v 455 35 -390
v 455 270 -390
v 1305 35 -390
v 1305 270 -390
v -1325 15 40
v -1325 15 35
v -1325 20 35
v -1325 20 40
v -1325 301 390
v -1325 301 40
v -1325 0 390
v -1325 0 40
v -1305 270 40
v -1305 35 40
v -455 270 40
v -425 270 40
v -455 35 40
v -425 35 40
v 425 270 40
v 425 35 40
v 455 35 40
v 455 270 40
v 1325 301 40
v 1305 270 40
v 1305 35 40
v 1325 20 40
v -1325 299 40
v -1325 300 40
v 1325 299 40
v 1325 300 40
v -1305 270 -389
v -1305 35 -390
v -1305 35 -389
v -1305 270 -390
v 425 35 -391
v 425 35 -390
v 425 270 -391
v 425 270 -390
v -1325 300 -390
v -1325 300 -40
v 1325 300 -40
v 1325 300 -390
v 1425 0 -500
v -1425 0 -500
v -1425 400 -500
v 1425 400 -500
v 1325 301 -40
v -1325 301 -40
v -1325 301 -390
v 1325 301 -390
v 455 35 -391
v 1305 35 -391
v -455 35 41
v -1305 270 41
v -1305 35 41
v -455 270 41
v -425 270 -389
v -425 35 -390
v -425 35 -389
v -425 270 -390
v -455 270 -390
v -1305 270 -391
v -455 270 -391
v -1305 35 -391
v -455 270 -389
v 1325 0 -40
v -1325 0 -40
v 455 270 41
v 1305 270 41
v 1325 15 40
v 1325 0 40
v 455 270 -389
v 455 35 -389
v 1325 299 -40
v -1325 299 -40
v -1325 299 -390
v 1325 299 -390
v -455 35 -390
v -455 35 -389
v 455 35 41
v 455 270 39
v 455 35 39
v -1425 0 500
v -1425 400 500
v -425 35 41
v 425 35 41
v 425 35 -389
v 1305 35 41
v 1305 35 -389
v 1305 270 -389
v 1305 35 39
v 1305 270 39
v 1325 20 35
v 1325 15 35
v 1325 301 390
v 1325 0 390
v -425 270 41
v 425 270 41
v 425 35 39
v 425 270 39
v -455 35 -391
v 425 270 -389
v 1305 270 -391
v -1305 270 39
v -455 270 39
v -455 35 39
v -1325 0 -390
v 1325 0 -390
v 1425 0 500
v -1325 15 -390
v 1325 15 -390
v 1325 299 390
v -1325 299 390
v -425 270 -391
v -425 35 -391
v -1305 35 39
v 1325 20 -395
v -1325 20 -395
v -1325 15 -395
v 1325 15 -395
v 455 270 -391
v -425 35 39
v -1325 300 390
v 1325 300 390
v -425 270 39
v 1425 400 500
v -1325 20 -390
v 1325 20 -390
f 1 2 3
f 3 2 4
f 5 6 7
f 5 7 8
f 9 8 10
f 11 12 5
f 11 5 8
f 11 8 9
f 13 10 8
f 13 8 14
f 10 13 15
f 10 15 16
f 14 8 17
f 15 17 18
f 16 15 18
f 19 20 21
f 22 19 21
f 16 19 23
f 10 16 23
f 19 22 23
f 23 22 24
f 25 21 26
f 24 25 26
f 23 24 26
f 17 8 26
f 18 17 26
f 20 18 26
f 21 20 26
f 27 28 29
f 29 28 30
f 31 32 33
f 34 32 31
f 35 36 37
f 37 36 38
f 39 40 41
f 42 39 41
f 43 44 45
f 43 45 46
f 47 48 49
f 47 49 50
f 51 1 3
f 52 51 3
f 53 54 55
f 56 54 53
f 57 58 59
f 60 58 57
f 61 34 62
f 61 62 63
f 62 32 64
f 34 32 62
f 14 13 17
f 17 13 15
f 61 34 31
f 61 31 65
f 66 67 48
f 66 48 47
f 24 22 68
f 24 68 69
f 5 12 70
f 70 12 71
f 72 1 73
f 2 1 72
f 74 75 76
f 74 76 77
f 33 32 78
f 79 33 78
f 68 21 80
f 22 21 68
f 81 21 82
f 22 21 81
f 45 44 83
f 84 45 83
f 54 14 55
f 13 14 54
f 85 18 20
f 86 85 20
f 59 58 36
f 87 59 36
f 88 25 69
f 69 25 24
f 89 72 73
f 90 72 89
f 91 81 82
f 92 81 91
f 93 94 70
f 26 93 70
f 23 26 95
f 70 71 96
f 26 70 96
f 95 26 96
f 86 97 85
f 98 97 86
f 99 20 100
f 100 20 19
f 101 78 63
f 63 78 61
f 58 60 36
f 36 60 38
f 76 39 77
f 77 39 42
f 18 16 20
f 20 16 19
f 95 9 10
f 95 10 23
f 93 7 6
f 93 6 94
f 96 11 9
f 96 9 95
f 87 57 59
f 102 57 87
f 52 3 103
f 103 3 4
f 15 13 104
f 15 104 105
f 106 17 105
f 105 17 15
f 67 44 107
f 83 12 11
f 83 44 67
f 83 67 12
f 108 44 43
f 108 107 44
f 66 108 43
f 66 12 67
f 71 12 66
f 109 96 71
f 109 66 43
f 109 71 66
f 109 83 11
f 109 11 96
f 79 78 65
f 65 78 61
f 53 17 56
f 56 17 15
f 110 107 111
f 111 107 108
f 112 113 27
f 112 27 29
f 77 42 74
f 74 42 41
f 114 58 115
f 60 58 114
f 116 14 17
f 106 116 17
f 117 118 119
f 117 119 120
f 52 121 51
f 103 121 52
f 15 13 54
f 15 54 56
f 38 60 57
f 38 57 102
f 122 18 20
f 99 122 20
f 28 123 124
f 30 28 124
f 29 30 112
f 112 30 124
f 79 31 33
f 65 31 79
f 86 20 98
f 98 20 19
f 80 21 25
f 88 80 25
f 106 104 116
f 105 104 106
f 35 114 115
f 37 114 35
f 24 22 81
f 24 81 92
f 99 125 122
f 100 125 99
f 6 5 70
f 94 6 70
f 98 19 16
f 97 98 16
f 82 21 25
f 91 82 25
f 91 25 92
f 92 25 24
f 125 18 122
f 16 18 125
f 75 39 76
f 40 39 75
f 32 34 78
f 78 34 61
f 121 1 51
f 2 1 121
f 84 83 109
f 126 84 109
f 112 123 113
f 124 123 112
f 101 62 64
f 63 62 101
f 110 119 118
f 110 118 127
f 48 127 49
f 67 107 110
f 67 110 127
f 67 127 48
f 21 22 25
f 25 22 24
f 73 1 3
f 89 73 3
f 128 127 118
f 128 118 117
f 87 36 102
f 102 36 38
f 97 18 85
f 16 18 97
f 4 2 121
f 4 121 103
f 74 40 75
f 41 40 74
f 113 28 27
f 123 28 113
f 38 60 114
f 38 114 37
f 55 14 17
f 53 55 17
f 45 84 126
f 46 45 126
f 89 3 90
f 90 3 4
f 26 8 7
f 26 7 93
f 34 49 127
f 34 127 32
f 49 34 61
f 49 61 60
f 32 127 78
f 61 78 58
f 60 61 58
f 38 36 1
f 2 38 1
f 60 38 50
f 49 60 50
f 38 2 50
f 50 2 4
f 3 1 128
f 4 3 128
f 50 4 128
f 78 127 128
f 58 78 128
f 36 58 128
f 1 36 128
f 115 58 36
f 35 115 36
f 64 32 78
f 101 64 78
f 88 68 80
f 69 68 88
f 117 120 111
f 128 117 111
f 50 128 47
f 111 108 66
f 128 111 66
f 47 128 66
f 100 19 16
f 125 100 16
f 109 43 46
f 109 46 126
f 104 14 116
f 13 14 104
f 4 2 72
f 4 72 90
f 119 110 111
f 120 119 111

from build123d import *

# Parameters (mm, degrees)
F0_W      = 2850
F0_H      = 1000
F1_DEPTH  = 400
F2_W      = 2650
F2_H      = 350
F3_DEPTH  = 300
F4_W      = 2650
F4_H      = 5
F5_DEPTH  = 5
F6_W      = 850
F6_H      = 235
F7_DEPTH  = 1
F8_W      = 2650
F8_H      = 5
F9_DEPTH  = 5
F10_W     = 850
F10_H     = 235
F10_W_2   = 425
F11_DEPTH = 1
F12_DEPTH = 1
F13_DEPTH = 1
F14_W     = 2650
F14_H     = 350
F15_DEPTH = 1
F16_DEPTH = 1


with BuildPart() as f1:
    # F0 (on Front) → F1 (new body)
    with BuildSketch(Plane.XZ):
        Rectangle(F0_W, F0_H)
    extrude(amount=-F1_DEPTH)

    # F2 (on Front) → F3 (cut)
    with BuildSketch(Plane.XZ):
        with Locations((0, 215)):
            Rectangle(F2_W, F2_H)
        with Locations((0, -215)):
            Rectangle(F2_W, F2_H)
    extrude(amount=-F3_DEPTH, mode=Mode.SUBTRACT)

    # F4 (on face) → F5 (cut)
    with BuildSketch(Plane.XY.offset(-390)):
        with Locations((0, 17.5)):
            Rectangle(F4_W, F4_H)
    extrude(amount=-F5_DEPTH, mode=Mode.SUBTRACT)

    # F6 (on face) → F7 (cut)
    with BuildSketch(Plane.XY.offset(-390)):
        with Locations((-880, 152.5)):
            Rectangle(F6_W, F6_H)
        with Locations((880, 152.5)):
            Rectangle(F6_W, F6_H)
        with Locations((0, 152.5)):
            Rectangle(F6_W, F6_H)
    extrude(amount=-F7_DEPTH, mode=Mode.SUBTRACT)

    # F8 (on face) → F9 (cut)
    with BuildSketch(Plane.XY.offset(40)):
        with Locations((0, 17.5)):
            Rectangle(F8_W, F8_H)
    extrude(amount=-F9_DEPTH, mode=Mode.SUBTRACT)

    # F10 (on face) → F11 (cut)
    with BuildSketch(Plane.XY.offset(40)):
        with Locations((-880, 152.5)):
            Rectangle(F10_W, F10_H)
        with Locations((880, 152.5)):
            Rectangle(F10_W, F10_H)
        with Locations((-212.5, 152.5)):
            Rectangle(F10_W_2, F10_H)
        with Locations((212.5, 152.5)):
            Rectangle(F10_W_2, F10_H)
    extrude(amount=-F11_DEPTH, mode=Mode.SUBTRACT)

    # F14 (on face) → F15 (cut)
    with BuildSketch(Plane.XZ.offset(-300)):
        with Locations((0, -215)):
            Rectangle(F14_W, F14_H)
        with Locations((0, 215)):
            Rectangle(F14_W, F14_H)
    extrude(amount=-F15_DEPTH, mode=Mode.SUBTRACT)


with BuildPart() as f12:
    # F10 (on face) → F12 (new body)
    with BuildSketch(Plane.XY.offset(40)):
        with Locations((-880, 152.5)):
            Rectangle(F10_W, F10_H)
        with Locations((880, 152.5)):
            Rectangle(F10_W, F10_H)
        with Locations((-212.5, 152.5)):
            Rectangle(F10_W_2, F10_H)
        with Locations((212.5, 152.5)):
            Rectangle(F10_W_2, F10_H)
    extrude(amount=F12_DEPTH)


with BuildPart() as f13:
    # F6 (on face) → F13 (new body)
    with BuildSketch(Plane.XY.offset(-390)):
        with Locations((-880, 152.5)):
            Rectangle(F6_W, F6_H)
        with Locations((880, 152.5)):
            Rectangle(F6_W, F6_H)
        with Locations((0, 152.5)):
            Rectangle(F6_W, F6_H)
    extrude(amount=F13_DEPTH)


with BuildPart() as f16:
    # F14 (on face) → F16 (new body)
    with BuildSketch(Plane.XZ.offset(-300)):
        with Locations((0, -215)):
            Rectangle(F14_W, F14_H)
        with Locations((0, 215)):
            Rectangle(F14_W, F14_H)
    extrude(amount=F16_DEPTH)


solid = Compound([f1.part, f12.part, f13.part, f16.part])
